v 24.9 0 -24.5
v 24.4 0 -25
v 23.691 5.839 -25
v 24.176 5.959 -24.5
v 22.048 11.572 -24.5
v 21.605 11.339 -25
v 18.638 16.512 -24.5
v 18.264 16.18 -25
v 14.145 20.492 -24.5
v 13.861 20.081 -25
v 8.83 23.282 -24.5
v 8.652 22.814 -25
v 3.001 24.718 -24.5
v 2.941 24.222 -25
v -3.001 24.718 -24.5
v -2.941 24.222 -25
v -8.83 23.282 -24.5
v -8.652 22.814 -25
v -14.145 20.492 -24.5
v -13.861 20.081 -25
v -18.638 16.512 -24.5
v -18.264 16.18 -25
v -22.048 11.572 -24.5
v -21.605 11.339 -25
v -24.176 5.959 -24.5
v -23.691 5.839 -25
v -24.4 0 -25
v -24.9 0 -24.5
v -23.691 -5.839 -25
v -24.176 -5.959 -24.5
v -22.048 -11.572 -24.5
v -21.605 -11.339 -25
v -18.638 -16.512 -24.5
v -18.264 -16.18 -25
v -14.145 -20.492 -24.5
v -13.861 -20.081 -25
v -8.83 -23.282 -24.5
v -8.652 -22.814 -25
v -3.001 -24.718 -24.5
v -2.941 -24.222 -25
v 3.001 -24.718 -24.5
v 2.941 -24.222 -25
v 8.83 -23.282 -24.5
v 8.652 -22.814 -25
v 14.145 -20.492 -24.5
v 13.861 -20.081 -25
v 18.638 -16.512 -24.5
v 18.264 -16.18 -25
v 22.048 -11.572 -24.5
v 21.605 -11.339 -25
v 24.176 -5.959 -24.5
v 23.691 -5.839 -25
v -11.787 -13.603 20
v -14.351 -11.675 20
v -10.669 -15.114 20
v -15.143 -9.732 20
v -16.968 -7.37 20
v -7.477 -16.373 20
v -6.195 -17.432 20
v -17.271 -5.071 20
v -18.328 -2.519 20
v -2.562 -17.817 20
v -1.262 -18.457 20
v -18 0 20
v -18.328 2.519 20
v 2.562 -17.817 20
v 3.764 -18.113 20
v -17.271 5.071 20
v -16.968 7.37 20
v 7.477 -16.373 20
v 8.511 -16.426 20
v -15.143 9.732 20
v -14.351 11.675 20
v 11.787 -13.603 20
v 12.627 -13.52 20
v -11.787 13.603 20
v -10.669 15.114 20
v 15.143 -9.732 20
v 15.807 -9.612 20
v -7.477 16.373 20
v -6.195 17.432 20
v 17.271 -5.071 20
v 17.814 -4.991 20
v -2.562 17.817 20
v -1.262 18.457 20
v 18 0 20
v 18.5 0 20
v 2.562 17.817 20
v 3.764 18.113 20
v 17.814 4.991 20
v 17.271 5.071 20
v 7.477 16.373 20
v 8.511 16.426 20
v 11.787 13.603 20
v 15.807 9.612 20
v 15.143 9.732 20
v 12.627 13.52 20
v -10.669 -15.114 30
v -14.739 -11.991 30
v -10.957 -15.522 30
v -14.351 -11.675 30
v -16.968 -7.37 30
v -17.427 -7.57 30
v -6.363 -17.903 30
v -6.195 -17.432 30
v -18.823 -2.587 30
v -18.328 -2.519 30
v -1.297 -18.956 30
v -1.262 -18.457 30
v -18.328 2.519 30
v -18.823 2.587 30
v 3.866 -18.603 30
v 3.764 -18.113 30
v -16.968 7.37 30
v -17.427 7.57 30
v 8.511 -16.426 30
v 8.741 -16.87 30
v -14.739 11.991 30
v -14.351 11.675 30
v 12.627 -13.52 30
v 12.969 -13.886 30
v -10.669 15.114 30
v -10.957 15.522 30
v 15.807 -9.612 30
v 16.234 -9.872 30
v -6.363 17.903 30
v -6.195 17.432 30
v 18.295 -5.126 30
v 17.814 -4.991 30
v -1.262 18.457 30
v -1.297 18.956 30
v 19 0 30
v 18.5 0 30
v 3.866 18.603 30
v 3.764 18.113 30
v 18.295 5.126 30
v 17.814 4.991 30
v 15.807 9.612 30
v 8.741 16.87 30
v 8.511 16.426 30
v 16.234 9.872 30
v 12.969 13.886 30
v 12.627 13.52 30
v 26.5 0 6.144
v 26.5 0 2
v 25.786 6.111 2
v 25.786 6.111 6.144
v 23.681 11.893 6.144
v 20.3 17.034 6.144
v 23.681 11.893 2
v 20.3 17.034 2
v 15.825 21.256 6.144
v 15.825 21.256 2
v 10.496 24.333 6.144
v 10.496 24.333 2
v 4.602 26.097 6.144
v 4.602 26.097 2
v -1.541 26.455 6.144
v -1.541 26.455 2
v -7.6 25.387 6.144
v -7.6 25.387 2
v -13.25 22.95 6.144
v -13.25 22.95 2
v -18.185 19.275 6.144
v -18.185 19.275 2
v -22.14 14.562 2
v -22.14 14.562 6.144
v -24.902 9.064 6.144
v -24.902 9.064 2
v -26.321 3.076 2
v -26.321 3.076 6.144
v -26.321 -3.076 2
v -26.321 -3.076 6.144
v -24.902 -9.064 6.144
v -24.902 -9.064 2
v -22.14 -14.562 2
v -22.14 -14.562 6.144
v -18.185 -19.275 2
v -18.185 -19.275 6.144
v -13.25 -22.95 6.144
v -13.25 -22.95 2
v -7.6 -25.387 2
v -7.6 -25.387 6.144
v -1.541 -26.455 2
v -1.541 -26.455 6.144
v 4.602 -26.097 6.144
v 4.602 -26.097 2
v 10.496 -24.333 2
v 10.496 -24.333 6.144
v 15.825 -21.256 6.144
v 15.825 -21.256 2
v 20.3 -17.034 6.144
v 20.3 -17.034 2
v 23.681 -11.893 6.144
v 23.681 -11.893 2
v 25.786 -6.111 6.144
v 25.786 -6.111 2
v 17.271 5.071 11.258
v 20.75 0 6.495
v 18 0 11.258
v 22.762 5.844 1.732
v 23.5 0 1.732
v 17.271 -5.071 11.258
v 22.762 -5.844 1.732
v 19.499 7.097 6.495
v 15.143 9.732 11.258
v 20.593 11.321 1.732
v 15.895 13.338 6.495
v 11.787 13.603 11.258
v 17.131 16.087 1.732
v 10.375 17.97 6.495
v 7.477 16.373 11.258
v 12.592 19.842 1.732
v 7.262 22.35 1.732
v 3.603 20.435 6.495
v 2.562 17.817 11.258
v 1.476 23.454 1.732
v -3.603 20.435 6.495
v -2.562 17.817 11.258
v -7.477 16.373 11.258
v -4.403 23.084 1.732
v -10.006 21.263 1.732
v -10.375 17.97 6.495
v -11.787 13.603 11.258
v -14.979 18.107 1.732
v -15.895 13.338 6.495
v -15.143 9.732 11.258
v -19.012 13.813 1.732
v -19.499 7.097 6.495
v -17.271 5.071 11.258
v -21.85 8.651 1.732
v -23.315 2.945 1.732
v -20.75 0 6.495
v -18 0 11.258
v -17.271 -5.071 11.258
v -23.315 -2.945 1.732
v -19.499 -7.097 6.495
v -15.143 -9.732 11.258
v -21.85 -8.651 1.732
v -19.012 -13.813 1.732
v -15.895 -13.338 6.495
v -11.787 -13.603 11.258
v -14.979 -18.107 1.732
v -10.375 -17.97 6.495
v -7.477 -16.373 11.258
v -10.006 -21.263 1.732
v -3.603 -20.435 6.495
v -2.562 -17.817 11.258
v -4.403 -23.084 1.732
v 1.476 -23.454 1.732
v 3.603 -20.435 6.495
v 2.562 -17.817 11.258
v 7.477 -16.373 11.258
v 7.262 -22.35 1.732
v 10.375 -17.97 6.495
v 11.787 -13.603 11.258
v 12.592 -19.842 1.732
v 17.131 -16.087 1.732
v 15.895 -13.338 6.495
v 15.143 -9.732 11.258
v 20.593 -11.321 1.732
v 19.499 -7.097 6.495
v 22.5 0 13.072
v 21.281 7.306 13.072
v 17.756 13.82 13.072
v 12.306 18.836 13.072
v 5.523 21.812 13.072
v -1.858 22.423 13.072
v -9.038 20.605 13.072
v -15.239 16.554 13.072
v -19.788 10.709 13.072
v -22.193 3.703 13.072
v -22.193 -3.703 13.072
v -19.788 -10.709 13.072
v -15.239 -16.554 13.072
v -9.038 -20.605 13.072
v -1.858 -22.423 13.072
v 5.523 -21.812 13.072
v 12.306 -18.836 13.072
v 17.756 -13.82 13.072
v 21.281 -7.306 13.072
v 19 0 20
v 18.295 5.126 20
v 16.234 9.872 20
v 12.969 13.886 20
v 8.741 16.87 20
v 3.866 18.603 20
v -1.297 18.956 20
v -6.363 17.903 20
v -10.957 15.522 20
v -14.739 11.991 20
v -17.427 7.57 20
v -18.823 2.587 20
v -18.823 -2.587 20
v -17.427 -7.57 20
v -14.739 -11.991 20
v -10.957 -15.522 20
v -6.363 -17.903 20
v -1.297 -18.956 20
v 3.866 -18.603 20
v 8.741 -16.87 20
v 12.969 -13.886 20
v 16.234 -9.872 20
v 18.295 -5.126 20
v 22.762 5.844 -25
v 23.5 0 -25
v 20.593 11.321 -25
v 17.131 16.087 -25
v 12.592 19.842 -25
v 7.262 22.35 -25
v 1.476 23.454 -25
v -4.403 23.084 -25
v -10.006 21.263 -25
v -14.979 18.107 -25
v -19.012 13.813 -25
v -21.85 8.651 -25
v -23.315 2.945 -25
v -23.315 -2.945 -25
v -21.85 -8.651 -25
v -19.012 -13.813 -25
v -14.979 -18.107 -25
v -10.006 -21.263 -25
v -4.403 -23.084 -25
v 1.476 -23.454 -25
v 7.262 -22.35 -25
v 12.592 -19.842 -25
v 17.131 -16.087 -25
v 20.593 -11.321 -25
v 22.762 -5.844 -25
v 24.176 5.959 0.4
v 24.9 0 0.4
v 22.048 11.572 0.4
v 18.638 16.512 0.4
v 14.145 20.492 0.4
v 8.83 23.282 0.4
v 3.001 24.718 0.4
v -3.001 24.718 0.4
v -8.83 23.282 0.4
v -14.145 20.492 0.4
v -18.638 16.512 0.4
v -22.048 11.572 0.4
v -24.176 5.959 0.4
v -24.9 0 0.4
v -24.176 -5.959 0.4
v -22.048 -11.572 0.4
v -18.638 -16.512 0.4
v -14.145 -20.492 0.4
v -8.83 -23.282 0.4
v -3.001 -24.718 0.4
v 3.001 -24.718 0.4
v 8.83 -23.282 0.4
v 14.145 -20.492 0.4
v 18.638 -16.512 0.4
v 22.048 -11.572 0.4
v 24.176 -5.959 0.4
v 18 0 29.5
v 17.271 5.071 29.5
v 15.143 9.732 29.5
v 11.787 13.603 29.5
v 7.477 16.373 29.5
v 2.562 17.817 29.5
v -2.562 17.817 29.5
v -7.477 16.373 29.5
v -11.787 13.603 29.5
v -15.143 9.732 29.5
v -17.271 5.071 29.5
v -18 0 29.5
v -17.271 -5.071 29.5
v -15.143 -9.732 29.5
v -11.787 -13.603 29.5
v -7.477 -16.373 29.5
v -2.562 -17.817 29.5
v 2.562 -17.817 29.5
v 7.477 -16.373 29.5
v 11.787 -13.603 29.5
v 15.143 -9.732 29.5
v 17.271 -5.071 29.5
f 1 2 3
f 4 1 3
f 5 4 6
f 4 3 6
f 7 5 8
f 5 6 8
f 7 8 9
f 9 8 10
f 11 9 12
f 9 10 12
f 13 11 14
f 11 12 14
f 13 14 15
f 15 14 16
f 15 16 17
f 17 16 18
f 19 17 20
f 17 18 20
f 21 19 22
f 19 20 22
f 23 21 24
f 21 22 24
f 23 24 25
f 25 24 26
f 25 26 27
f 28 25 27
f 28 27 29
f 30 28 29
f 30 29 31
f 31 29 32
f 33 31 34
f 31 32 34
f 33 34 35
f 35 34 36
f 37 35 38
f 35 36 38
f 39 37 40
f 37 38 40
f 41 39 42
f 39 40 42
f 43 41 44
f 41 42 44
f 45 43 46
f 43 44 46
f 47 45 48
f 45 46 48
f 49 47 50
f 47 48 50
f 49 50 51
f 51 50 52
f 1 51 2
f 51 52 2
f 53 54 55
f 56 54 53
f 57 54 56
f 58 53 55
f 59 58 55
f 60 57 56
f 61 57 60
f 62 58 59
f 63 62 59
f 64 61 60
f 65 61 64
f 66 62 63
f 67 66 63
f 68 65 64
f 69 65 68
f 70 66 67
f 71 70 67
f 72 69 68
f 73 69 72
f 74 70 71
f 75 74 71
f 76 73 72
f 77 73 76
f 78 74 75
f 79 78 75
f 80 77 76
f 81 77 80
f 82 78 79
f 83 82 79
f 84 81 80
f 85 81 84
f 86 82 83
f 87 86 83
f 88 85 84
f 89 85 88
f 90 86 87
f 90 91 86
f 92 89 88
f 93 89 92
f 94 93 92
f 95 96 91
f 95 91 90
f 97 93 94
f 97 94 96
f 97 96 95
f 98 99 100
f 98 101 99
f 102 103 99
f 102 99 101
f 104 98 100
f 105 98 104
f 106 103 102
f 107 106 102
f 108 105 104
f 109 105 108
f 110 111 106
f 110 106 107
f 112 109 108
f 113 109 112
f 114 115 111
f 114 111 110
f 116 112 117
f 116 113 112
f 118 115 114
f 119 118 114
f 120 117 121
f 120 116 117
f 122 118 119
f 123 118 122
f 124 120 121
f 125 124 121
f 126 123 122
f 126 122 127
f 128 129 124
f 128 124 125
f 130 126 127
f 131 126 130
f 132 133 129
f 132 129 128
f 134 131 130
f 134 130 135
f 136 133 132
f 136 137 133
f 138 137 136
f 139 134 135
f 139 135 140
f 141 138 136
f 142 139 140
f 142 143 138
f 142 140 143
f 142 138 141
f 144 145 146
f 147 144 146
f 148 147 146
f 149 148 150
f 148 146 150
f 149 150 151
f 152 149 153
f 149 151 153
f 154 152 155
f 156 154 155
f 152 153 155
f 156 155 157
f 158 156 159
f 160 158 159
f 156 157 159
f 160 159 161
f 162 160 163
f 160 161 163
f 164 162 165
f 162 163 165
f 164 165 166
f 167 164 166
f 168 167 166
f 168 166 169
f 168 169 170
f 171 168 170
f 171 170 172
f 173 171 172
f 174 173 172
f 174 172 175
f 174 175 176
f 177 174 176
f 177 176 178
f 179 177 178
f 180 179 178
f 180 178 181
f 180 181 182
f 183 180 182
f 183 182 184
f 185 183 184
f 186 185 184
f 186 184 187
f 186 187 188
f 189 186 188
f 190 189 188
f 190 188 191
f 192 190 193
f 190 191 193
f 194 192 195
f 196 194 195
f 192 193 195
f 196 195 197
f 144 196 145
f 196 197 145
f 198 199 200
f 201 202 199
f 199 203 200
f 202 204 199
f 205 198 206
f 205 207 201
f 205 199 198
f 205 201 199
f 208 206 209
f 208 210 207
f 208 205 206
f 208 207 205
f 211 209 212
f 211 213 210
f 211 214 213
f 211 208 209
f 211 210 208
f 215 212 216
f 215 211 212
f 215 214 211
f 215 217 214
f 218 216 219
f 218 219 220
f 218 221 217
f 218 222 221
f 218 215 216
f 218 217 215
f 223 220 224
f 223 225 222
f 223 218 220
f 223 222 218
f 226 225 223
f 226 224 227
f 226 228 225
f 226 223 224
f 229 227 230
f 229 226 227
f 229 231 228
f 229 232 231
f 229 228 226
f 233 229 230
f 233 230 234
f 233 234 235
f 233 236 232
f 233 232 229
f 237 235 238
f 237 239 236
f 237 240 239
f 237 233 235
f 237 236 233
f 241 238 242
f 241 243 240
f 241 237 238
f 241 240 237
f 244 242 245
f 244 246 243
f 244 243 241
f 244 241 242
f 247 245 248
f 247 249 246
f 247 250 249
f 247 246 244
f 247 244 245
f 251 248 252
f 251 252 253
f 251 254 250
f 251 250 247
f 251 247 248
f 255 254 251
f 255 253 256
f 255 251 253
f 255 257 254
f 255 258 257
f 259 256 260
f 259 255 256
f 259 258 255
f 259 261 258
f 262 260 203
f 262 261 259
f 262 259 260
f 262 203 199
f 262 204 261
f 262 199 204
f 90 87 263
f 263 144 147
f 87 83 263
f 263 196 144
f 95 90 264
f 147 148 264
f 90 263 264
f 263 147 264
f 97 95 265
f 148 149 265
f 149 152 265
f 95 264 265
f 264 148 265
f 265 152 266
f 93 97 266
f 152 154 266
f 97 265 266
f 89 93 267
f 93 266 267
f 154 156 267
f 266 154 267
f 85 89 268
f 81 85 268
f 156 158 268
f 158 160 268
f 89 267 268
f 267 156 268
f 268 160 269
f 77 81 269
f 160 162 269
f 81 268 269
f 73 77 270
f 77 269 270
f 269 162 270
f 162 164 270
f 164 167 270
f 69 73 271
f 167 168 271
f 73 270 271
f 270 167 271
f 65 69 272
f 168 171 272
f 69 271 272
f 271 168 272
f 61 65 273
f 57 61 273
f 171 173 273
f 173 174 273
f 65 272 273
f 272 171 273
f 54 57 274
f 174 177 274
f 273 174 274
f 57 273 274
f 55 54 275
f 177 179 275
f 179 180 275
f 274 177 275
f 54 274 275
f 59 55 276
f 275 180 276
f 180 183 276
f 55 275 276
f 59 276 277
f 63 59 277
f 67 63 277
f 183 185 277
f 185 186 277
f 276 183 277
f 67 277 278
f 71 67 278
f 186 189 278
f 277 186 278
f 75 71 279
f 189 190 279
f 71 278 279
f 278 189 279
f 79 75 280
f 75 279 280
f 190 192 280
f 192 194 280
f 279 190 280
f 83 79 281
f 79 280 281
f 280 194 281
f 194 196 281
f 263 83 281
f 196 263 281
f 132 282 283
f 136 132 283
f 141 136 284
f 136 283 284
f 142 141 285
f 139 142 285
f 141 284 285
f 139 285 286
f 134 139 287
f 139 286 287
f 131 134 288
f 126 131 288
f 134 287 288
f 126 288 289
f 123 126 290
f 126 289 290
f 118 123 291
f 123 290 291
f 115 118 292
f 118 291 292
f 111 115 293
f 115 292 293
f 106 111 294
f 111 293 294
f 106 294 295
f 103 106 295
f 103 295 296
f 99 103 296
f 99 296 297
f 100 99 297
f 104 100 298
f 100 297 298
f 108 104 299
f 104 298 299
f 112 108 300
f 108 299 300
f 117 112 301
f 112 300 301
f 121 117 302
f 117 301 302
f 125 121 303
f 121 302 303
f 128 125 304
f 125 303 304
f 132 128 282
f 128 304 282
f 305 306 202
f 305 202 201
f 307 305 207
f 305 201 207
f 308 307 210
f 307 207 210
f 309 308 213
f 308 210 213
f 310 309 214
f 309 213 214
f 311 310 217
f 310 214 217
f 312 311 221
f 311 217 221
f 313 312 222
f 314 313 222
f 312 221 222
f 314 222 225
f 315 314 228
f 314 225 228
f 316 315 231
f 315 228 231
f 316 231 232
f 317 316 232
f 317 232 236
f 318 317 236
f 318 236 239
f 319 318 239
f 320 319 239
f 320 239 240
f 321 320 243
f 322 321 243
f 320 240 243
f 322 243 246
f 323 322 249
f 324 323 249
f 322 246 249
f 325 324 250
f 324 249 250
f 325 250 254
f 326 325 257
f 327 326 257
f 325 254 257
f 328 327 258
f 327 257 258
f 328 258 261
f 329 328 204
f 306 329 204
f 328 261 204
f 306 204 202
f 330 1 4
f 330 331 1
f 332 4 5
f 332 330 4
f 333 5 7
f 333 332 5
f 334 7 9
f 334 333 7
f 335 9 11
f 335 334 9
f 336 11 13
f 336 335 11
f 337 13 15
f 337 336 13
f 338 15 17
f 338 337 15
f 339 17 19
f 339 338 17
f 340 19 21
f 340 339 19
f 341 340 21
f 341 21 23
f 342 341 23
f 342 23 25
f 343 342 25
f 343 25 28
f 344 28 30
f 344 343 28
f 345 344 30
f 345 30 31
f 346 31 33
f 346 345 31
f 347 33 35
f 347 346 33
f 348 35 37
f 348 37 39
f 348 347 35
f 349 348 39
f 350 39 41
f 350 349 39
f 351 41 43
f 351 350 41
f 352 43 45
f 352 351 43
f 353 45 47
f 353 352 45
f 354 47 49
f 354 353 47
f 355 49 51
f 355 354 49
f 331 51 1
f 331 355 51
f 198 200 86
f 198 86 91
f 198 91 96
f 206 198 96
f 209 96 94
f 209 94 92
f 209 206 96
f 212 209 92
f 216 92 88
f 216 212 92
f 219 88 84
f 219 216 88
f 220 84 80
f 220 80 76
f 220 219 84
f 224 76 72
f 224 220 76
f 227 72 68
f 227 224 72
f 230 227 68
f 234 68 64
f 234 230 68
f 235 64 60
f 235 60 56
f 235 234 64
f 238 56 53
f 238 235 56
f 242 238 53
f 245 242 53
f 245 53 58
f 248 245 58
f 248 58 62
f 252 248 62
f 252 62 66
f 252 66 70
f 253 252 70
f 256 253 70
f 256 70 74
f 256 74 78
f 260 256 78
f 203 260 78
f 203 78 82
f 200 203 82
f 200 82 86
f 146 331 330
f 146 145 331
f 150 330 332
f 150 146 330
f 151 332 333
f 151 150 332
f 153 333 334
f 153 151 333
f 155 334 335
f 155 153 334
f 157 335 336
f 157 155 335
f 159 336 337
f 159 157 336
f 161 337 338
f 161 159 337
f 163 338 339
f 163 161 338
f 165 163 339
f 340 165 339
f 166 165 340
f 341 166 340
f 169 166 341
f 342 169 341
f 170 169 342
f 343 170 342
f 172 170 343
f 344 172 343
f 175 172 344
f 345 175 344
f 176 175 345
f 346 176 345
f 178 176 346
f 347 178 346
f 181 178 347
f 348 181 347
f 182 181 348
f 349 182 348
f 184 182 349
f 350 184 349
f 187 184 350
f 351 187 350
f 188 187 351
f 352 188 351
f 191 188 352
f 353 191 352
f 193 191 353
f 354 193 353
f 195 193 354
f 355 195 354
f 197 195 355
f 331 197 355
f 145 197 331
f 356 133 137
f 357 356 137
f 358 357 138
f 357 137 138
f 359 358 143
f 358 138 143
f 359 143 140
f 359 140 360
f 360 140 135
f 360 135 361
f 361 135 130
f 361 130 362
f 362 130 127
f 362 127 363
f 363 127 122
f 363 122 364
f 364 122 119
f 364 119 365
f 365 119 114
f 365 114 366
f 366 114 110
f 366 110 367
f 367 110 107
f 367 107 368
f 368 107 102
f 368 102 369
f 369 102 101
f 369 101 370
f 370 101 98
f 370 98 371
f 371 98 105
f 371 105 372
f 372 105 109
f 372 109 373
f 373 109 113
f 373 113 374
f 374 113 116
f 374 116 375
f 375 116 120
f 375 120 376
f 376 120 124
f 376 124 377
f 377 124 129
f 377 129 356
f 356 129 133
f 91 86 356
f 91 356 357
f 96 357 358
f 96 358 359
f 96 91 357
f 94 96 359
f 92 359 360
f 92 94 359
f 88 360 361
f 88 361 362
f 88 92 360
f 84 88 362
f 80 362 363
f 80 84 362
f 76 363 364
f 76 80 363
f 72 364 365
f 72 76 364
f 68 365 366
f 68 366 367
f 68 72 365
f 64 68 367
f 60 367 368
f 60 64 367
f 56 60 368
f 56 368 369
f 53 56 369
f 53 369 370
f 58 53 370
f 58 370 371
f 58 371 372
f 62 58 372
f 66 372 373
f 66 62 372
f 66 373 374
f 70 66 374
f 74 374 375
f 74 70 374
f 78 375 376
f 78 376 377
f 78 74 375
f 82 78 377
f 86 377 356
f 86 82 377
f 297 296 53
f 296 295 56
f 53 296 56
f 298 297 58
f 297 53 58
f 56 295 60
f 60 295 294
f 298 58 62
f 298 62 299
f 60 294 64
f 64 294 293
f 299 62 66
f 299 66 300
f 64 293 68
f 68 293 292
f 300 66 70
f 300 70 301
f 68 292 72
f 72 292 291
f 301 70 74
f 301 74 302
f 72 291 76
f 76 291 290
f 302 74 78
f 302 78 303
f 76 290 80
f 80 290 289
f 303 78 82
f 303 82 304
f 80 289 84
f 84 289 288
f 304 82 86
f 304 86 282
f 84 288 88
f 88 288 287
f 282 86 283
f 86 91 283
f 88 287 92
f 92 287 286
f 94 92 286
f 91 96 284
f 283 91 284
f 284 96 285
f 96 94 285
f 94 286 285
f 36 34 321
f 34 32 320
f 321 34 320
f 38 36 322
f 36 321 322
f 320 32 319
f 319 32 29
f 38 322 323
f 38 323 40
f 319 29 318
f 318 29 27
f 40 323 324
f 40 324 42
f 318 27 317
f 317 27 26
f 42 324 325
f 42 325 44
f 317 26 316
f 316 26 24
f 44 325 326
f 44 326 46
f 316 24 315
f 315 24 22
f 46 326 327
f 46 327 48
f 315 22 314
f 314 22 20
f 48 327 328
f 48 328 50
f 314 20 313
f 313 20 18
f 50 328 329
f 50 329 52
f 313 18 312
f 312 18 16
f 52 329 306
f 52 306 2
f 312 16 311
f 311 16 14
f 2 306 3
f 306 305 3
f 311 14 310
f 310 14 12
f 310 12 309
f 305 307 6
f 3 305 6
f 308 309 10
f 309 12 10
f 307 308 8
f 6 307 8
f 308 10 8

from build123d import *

# Parameters (mm, degrees)
F0_R        = 26.5
F0_R_2      = 24.9
F0_R_3      = 23.5
F0_R_4      = 19
F0_R_5      = 18
F1_DEPTH    = 20
F2_DEPTH    = 25
F3_START    = 20
F3_DEPTH    = 10
F4_SIZE2    = 13.8564064606
F4_SIZE     = 8
F5_SIZE     = 0.5
F6_SIZE     = 0.5
F7_S5_R     = 24.9
F7_T6_DEPTH = 39
F8_S5_R     = 23.5
F8_T6_DEPTH = 37


# Not quite as in the source:
# - a fillet or chamfer that OpenCascade refuses, or shapes differently, is made with other operations: its cross-section is extruded or revolved along the edge and cut away or added


with BuildPart() as f1:
    # F0 (on Top) → F1 (new body)
    with BuildSketch(Plane.XY):
        Circle(F0_R)
        Circle(F0_R_2, mode=Mode.SUBTRACT)
        Circle(F0_R_2)
        Circle(F0_R_3, mode=Mode.SUBTRACT)
        Circle(F0_R_3)
        Circle(F0_R_4, mode=Mode.SUBTRACT)
        Circle(F0_R_4)
        Circle(F0_R_5, mode=Mode.SUBTRACT)
    extrude(amount=F1_DEPTH)

    # F0 (on Top) → F2 (join)
    with BuildSketch(Plane.XY):
        Circle(F0_R_2)
        Circle(F0_R_3, mode=Mode.SUBTRACT)
    extrude(amount=-F2_DEPTH)

    # F4
    f4_edges = [f1.edges().sort_by_distance(p)[0] for p in [
        (-26.5, 0, 20),
    ]]
    f4_side = f1.faces().sort_by_distance((-25.750467, 0, 20))[0]
    chamfer(f4_edges, length=F4_SIZE, length2=F4_SIZE2, reference=f4_side)

    # F6
    f6_edges = [f1.edges().sort_by_distance(p)[0] for p in [
        (-24.9, 0, -25),
    ]]
    chamfer(f6_edges, length=F6_SIZE)

    # F7: chamfer of 2 on 1 edges, made by hand


with BuildPart() as f3:
    # F0 (on Top) → F3 (new body)
    with BuildSketch(Plane.XY.offset(F3_START)):
        Circle(F0_R_4)
        Circle(F0_R_5, mode=Mode.SUBTRACT)
    extrude(amount=F3_DEPTH)

    # F5
    f5_edges = [f3.edges().sort_by_distance(p)[0] for p in [
        (-18, 0, 30),
    ]]
    chamfer(f5_edges, length=F5_SIZE)


with BuildPart() as f7_tool2:
    # F7_s3 → F7_t4 (revolve)
    with BuildSketch(Plane.XZ):
        Polygon((24.5, 0), (26.5, 2), (26.5, 0), align=None)
    revolve(axis=Axis((0, 0, 0), (0, 0, 1)))

    # F7_s5 → F7_t6 (cut, symmetric)
    with BuildSketch(Plane.XY.offset(1)):
        Circle(F7_S5_R)
    extrude(amount=F7_T6_DEPTH, both=True, mode=Mode.SUBTRACT)


with BuildPart() as f1_1:
    add(f1.part)

    # F7_t1: cut F7_tool2
    add(f7_tool2.part, mode=Mode.SUBTRACT)

    # F8: chamfer of 6.5 x 11.2583302492 on 1 edges, made by hand


with BuildPart() as f8_tool2:
    # F8_s3 → F8_t4 (revolve)
    with BuildSketch(Plane.XZ):
        Polygon((18, 11.2583302492), (24.5, 0), (18, 0), align=None)
    revolve(axis=Axis((0, 0, 0), (0, 0, 1)))

    # F8_s5 → F8_t6 (intersect, symmetric)
    with BuildSketch(Plane.XY.offset(5.6)):
        Circle(F8_S5_R)
    extrude(amount=F8_T6_DEPTH, both=True, mode=Mode.INTERSECT)


with BuildPart() as f1_2:
    add(f1_1.part)

    # F8_t1: cut F8_tool2
    add(f8_tool2.part, mode=Mode.SUBTRACT)


solid = Compound([f3.part, f1_2.part])
